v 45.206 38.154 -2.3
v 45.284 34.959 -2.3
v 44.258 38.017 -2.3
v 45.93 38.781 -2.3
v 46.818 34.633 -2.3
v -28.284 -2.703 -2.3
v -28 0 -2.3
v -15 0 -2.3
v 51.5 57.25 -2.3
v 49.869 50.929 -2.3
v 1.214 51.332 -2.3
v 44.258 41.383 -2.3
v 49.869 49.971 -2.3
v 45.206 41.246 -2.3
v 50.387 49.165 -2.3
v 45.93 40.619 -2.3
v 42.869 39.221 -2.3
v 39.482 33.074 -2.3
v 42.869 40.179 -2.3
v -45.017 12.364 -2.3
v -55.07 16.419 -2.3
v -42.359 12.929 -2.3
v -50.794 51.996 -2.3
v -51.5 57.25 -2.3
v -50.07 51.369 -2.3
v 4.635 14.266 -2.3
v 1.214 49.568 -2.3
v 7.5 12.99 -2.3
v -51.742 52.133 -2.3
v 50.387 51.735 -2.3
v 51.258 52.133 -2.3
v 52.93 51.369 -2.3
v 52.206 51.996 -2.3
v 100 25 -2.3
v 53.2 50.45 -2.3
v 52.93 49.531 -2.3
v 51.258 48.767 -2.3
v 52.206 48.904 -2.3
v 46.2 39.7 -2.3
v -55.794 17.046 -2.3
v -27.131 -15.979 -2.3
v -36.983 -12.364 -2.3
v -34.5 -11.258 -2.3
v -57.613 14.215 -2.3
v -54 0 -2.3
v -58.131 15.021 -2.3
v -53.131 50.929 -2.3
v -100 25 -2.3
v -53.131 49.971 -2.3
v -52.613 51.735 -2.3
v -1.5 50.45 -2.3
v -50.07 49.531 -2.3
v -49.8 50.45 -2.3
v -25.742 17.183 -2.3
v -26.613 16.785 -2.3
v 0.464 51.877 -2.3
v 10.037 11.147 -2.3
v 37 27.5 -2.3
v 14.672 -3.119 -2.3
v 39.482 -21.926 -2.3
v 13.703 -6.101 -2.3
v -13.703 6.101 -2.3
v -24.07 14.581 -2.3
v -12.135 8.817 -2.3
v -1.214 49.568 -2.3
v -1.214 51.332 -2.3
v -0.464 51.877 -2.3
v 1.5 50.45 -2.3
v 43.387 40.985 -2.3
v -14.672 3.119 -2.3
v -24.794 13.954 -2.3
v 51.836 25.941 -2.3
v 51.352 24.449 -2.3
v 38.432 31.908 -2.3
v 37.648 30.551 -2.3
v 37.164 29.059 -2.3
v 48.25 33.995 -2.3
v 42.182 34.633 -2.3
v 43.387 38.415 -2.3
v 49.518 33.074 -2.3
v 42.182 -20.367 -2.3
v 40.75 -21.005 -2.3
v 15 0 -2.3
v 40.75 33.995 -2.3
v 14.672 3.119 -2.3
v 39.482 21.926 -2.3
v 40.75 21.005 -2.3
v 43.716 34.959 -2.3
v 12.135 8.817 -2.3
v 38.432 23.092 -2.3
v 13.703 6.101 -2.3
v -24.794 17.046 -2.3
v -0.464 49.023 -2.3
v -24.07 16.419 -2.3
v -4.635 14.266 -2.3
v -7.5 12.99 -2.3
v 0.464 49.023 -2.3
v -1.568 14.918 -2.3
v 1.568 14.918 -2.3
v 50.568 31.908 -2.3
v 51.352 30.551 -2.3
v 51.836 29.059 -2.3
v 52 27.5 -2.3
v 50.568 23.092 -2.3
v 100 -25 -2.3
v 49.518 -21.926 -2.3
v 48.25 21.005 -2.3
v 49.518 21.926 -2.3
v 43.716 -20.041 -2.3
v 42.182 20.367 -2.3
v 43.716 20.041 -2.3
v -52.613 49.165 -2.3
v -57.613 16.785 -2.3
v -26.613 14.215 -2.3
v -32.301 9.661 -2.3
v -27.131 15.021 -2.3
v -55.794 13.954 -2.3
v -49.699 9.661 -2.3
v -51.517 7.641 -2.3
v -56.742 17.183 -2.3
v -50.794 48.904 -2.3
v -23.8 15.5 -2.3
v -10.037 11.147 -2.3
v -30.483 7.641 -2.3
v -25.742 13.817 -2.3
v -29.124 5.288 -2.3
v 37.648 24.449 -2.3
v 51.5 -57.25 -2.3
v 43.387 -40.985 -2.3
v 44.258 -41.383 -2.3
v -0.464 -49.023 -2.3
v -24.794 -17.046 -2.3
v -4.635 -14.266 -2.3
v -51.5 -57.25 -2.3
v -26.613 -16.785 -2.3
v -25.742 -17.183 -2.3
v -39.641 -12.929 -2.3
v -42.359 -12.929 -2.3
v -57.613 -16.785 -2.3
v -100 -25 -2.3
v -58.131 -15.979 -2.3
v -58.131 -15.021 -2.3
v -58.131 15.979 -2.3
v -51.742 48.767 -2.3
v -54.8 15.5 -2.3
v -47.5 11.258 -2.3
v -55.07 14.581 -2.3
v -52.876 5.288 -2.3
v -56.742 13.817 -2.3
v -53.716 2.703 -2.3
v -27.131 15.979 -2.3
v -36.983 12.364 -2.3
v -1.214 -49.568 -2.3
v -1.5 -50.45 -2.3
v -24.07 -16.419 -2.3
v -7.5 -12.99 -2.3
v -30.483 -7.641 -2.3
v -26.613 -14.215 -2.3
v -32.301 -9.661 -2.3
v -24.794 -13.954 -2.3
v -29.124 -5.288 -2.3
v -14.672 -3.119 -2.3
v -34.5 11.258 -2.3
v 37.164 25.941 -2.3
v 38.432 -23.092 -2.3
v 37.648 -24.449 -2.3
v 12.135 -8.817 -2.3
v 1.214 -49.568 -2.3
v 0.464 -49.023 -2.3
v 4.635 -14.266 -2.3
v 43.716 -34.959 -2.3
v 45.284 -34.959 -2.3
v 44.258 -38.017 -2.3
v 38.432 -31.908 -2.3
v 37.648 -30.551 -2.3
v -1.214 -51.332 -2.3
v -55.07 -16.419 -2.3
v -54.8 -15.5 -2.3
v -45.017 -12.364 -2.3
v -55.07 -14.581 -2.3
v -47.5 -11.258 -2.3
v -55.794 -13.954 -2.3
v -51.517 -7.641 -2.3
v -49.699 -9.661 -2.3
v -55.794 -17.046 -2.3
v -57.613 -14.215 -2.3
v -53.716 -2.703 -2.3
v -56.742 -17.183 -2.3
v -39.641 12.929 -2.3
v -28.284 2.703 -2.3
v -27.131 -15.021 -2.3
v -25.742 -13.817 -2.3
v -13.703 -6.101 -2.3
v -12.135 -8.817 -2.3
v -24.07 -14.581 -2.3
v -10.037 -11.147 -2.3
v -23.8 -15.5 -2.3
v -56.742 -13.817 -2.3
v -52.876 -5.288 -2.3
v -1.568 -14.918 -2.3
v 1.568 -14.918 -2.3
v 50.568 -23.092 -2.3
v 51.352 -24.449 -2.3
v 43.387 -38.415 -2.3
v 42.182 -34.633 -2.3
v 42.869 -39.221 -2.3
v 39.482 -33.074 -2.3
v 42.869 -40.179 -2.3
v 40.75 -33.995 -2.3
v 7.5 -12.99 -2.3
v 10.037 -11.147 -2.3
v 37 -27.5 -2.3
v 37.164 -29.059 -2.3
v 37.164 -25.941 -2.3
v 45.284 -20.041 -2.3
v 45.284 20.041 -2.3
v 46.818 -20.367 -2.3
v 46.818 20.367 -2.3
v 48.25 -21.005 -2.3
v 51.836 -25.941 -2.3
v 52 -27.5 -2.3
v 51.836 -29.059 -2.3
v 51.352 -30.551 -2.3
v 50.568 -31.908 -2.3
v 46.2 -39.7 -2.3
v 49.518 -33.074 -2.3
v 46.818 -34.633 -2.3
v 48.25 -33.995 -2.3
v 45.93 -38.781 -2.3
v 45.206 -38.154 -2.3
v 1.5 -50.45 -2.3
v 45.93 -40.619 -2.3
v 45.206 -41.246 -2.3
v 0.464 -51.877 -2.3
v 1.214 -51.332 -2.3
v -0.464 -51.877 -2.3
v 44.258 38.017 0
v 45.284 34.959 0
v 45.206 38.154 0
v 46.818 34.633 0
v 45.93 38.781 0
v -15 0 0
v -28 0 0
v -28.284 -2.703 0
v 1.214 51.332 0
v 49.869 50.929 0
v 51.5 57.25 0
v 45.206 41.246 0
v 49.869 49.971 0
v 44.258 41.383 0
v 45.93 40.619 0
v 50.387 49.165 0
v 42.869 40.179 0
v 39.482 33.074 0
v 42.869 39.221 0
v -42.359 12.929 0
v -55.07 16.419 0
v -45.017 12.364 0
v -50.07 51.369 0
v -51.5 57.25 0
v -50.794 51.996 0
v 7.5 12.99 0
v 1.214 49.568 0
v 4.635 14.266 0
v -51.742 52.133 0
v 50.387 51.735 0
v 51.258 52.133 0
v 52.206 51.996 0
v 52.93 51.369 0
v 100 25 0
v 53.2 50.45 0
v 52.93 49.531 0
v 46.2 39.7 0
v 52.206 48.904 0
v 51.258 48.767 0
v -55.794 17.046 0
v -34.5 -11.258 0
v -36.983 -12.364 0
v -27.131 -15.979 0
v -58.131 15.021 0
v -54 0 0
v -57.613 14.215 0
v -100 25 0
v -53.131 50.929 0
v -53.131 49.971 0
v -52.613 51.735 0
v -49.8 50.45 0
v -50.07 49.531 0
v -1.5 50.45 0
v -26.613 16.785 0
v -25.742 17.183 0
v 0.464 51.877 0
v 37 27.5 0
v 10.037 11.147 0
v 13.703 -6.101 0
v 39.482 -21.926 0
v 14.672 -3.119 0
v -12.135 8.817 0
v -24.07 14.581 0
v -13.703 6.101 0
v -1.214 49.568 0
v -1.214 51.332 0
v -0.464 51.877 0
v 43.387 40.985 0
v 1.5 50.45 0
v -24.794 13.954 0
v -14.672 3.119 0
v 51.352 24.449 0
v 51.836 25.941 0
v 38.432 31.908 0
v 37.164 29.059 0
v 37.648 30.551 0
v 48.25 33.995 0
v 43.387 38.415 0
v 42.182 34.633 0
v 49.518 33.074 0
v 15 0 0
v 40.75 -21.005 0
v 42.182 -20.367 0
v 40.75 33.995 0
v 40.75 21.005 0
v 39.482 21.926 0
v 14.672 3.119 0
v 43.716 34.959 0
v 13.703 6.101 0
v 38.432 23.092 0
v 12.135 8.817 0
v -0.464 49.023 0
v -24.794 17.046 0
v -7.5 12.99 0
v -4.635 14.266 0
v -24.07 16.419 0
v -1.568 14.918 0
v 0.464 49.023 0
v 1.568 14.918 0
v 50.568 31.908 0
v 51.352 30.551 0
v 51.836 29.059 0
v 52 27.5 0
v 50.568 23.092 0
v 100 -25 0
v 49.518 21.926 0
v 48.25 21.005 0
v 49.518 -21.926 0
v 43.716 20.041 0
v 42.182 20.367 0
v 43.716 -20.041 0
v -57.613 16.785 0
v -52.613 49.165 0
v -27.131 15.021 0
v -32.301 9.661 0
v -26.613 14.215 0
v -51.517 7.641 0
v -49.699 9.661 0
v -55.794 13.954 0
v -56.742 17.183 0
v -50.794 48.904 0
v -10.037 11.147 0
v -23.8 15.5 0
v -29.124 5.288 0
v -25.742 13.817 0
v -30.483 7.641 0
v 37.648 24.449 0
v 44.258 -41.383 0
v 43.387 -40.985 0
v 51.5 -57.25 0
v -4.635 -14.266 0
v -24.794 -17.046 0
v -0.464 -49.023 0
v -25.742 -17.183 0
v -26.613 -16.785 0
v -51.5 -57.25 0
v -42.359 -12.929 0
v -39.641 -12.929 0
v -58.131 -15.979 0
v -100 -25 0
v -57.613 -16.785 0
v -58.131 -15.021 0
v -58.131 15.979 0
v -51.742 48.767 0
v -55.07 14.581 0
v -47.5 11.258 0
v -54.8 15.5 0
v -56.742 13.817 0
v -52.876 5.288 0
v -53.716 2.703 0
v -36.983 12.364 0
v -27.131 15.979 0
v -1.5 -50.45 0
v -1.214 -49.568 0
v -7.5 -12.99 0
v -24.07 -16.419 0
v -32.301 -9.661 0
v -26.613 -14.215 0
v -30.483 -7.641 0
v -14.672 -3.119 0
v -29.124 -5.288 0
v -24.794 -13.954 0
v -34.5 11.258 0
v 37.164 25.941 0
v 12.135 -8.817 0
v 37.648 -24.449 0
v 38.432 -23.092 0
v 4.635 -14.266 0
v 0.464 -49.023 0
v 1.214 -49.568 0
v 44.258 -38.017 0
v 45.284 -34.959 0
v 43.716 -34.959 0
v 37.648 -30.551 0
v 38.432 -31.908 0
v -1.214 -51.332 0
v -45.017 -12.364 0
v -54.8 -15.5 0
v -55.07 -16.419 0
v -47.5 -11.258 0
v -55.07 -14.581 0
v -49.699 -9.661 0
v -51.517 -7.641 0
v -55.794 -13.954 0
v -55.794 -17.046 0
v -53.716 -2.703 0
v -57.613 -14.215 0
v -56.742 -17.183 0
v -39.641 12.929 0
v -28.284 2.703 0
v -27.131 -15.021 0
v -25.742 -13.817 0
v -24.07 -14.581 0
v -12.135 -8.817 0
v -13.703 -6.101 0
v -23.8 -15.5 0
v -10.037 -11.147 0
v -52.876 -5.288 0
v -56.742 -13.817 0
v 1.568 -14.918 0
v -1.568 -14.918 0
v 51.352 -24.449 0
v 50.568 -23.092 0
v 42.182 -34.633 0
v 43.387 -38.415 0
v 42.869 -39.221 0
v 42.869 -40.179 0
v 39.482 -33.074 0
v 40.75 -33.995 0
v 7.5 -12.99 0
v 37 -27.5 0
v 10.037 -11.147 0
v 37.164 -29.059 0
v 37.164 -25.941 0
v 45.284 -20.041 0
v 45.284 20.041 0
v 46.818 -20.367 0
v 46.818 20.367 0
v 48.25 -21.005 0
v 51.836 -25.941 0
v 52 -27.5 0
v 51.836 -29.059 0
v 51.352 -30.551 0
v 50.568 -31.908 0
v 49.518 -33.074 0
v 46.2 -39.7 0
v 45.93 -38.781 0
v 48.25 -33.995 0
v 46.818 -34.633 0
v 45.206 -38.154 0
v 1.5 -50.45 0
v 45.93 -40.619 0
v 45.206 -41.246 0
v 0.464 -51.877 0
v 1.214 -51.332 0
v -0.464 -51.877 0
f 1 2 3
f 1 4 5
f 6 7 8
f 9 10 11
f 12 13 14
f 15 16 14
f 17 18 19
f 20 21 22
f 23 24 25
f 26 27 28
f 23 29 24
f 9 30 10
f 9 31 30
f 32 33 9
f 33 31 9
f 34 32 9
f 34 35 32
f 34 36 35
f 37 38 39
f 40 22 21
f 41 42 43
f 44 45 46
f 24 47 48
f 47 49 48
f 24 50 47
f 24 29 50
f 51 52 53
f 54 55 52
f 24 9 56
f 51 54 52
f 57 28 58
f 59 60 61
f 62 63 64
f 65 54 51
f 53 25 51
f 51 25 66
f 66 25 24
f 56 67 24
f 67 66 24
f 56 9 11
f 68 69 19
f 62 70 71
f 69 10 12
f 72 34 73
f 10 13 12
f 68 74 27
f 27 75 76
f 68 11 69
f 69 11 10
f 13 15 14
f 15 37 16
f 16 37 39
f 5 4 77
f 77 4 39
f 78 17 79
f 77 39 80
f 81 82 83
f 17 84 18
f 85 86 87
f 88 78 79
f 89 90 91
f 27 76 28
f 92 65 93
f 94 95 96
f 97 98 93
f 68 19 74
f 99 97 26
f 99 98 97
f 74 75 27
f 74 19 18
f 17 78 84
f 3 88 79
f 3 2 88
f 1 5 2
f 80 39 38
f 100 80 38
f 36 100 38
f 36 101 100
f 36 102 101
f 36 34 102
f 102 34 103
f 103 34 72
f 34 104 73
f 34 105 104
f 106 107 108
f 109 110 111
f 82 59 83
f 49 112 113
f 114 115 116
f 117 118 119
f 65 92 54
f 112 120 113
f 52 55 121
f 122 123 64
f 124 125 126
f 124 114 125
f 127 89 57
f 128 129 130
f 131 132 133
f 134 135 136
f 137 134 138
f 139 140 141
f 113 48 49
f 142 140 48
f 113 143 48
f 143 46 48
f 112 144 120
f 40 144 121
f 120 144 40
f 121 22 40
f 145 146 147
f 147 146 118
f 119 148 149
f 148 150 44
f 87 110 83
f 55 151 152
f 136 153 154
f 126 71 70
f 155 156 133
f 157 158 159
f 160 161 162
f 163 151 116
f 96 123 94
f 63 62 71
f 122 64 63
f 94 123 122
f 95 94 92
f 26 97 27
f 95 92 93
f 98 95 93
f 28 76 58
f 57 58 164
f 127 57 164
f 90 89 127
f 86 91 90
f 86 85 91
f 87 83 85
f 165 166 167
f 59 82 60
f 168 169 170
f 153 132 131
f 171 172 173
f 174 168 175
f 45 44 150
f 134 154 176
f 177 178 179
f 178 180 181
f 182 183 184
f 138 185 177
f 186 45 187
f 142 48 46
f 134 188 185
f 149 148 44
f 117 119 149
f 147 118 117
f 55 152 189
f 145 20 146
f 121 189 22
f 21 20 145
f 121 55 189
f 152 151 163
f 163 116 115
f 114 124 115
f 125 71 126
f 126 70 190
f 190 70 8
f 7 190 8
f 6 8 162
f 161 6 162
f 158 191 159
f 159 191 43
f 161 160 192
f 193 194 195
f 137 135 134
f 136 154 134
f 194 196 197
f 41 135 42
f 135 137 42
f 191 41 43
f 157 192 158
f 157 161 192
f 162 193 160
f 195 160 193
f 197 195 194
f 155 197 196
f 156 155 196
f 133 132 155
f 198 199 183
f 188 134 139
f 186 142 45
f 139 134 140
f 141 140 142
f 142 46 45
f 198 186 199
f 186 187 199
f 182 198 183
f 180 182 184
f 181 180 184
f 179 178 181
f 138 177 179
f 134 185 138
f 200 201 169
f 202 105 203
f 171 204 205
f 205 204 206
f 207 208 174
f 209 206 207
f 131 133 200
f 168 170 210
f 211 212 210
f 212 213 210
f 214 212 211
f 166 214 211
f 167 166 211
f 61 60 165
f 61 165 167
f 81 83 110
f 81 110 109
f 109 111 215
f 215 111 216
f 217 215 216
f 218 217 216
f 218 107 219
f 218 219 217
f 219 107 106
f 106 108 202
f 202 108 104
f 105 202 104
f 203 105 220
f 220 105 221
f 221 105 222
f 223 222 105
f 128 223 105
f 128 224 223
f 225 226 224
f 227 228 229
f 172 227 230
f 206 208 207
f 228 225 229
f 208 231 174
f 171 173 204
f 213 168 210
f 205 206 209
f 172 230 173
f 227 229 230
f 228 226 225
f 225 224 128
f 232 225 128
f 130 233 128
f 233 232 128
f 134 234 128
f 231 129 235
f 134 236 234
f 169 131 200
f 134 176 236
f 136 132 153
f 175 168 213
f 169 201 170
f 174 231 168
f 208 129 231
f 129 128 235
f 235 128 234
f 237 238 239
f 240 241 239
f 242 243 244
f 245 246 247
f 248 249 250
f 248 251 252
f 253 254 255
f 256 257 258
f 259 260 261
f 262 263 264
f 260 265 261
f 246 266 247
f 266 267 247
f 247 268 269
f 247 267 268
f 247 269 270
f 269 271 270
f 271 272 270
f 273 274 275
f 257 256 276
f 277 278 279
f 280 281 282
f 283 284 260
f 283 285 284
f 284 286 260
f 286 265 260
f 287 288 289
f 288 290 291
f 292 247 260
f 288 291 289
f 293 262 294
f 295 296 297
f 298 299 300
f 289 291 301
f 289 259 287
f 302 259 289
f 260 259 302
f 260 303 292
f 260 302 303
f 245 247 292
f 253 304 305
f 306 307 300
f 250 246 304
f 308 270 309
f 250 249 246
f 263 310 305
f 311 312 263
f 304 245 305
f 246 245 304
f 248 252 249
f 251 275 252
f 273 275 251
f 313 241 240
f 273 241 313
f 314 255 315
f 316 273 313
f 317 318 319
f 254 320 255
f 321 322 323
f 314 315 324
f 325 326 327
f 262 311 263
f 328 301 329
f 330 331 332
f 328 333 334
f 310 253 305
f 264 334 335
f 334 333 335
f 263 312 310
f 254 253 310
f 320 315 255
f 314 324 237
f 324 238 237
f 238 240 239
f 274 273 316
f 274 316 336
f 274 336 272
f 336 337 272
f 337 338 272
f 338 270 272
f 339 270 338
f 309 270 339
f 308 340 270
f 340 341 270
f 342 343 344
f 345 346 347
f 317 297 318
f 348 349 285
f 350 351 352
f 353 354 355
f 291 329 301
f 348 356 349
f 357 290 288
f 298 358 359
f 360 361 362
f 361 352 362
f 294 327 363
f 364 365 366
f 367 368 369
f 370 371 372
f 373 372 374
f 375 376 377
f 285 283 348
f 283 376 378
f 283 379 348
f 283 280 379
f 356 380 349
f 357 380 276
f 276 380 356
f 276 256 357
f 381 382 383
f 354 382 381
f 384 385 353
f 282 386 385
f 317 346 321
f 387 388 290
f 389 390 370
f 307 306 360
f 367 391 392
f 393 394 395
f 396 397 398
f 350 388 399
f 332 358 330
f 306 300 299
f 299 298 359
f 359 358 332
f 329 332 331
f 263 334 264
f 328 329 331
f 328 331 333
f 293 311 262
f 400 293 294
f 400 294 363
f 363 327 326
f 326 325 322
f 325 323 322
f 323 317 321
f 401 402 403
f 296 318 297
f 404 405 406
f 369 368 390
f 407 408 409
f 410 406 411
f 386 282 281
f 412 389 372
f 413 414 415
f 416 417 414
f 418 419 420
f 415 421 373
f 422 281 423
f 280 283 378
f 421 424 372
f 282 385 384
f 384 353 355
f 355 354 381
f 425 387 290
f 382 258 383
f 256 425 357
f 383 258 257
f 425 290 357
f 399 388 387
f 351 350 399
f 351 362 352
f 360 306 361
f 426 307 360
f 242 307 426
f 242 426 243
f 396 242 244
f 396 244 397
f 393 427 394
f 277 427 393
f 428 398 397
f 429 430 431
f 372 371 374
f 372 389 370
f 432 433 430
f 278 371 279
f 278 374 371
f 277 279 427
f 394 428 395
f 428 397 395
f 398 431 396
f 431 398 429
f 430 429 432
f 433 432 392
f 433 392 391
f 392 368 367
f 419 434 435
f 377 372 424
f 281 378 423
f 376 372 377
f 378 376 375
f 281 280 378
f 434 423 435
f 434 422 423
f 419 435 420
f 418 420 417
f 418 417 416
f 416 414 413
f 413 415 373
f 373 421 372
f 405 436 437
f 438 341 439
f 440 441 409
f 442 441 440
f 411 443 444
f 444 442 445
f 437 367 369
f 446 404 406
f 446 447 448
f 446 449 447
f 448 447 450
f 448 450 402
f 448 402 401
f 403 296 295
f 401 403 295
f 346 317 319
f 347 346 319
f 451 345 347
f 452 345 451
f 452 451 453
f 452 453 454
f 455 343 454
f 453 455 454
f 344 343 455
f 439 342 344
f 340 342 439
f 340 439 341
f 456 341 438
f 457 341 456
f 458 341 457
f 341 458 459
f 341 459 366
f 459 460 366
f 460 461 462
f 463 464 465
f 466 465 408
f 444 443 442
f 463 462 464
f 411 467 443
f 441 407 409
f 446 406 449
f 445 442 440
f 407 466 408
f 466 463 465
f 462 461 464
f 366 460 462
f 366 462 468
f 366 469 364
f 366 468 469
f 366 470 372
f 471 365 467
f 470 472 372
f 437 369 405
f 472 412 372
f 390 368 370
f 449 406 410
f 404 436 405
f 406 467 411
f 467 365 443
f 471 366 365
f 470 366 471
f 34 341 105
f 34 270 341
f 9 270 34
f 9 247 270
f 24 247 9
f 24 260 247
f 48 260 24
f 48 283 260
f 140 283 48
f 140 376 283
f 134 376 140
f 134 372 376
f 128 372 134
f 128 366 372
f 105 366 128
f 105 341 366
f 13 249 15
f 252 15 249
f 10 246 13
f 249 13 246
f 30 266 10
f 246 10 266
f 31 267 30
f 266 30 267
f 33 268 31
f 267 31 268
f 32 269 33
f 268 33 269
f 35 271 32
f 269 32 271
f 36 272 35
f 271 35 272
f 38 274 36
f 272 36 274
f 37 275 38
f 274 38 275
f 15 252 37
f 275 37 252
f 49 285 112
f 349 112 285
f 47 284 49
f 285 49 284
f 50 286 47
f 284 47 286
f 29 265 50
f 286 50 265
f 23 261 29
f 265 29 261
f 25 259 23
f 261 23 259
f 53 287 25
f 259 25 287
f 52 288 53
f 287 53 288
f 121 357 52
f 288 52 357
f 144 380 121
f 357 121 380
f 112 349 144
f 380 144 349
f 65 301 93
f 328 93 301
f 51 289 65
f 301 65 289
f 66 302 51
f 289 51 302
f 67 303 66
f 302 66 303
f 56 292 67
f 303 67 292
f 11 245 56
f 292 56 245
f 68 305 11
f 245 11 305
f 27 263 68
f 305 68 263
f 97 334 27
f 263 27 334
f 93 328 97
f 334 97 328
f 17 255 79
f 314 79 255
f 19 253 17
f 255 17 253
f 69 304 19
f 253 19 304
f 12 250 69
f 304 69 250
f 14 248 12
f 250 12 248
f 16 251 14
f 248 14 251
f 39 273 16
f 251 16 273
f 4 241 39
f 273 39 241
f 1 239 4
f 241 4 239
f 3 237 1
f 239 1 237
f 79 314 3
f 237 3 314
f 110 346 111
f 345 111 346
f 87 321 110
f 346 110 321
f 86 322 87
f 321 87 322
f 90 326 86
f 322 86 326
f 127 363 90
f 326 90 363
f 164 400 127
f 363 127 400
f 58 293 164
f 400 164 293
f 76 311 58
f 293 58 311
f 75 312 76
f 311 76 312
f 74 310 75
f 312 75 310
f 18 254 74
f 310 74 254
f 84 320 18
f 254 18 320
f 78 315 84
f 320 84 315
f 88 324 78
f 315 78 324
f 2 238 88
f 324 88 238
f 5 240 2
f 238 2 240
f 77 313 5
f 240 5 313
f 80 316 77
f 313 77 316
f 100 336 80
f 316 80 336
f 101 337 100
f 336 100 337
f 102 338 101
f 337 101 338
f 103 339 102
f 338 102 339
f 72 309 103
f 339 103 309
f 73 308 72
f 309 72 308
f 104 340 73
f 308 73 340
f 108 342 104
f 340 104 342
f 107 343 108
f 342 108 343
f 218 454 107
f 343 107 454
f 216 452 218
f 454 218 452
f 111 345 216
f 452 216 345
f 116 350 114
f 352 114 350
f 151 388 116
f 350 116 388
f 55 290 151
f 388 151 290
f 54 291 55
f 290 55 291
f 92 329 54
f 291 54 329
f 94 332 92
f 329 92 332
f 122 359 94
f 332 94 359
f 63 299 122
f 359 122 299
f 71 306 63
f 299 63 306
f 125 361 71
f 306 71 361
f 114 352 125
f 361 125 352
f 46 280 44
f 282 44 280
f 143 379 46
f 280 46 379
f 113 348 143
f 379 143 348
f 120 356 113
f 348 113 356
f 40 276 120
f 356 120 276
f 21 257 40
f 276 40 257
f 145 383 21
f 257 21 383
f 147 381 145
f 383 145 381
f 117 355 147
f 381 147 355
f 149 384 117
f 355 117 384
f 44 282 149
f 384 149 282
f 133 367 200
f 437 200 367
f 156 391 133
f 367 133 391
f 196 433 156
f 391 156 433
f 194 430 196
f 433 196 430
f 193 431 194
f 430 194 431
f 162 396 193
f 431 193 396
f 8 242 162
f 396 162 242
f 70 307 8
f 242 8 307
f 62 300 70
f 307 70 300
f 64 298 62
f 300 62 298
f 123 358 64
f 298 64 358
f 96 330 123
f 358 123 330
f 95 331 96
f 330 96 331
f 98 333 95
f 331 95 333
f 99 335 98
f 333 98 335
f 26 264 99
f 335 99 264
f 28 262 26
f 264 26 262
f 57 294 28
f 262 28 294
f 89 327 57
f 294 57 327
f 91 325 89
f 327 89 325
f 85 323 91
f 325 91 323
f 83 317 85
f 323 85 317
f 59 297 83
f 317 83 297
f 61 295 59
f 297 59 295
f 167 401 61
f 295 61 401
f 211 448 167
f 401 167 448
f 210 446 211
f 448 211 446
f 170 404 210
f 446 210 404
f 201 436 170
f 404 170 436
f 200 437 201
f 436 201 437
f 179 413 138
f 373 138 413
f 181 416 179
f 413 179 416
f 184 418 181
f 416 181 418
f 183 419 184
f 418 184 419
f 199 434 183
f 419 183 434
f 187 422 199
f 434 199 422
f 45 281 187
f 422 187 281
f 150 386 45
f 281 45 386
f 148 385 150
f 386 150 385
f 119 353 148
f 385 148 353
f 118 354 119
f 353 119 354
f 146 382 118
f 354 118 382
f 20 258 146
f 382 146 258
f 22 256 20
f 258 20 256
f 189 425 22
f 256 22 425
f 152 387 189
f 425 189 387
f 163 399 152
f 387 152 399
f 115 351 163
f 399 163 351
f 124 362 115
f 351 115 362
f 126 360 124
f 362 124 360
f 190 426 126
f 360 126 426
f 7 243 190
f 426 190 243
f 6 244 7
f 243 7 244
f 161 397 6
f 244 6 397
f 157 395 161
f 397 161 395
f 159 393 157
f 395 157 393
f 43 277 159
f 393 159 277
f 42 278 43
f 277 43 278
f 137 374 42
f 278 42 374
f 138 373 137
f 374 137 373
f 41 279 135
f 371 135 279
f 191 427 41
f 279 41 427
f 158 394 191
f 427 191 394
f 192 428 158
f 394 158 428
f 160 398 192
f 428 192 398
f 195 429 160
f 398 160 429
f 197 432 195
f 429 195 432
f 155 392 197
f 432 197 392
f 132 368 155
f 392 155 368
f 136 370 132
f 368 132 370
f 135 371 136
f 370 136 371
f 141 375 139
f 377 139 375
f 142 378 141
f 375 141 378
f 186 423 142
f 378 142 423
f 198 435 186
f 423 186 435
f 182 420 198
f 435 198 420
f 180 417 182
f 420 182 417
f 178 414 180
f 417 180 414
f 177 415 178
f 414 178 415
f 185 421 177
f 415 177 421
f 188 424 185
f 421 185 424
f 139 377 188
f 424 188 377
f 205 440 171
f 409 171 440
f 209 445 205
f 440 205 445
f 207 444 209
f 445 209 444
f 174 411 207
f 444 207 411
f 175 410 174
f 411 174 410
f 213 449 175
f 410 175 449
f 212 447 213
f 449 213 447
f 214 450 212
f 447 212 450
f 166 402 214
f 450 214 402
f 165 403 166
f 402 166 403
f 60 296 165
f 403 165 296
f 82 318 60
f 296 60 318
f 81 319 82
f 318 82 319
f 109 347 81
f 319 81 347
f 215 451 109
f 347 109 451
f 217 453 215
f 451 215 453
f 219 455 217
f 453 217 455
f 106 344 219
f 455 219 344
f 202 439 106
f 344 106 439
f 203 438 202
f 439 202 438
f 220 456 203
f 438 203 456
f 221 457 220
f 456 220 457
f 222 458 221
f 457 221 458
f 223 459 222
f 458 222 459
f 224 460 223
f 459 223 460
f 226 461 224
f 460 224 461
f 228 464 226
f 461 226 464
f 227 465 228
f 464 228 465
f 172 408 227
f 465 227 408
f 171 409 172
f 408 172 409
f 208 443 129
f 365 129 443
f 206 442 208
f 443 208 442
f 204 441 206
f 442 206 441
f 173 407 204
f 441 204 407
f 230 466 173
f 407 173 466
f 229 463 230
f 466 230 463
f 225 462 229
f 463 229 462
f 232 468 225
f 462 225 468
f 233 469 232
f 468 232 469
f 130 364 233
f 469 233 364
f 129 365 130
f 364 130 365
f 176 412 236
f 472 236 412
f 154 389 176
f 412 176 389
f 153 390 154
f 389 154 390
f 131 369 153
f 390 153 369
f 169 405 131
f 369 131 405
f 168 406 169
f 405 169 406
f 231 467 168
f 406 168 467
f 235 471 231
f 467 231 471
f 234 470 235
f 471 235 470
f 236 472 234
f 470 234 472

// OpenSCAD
$fs=1.0;

center_plate();

module center_plate_2d(){
    difference(){
        hull(){
            square([103, 114.5], center=true);
            square([200, 50], center=true);
        }
        circle(d=30);
        
        // nema 17 motor mount
        translate([-13-(30+26)/2, 0]){
            circle(d=26);
            translate([31/2, 31/2]) circle(d=3.4);
            translate([-31/2, 31/2]) circle(d=3.4);
            translate([31/2, -31/2]) circle(d=3.4);
            translate([-31/2, -31/2]) circle(d=3.4);
        }
        
        // cable holes
        translate([22+(15+30)/2, 55/2]) circle(d=15);
        translate([22+(15+30)/2, -55/2]) circle(d=15);
        translate([22+(15+30)/2, 3+(55+15+3.4)/2]) circle(d=3.4);
        translate([22+(15+30)/2, -3-(55+15+3.4)/2]) circle(d=3.4);
        
        // mounting holes
        translate([0, (114.5-2.6)/2-5.5]) circle(d=3.0);
        translate([0, -(114.5-2.6)/2+5.5]) circle(d=3.0);
        
        translate([103/2, (114.5-2.6)/2-5.5]) circle(d=3.4);
        translate([-103/2, (114.5-2.6)/2-5.5]) circle(d=3.4);
    }
}

module center_plate(t=2.3){
    translate([0,0,-t]) linear_extrude(height=t){
        center_plate_2d();
    }
}
